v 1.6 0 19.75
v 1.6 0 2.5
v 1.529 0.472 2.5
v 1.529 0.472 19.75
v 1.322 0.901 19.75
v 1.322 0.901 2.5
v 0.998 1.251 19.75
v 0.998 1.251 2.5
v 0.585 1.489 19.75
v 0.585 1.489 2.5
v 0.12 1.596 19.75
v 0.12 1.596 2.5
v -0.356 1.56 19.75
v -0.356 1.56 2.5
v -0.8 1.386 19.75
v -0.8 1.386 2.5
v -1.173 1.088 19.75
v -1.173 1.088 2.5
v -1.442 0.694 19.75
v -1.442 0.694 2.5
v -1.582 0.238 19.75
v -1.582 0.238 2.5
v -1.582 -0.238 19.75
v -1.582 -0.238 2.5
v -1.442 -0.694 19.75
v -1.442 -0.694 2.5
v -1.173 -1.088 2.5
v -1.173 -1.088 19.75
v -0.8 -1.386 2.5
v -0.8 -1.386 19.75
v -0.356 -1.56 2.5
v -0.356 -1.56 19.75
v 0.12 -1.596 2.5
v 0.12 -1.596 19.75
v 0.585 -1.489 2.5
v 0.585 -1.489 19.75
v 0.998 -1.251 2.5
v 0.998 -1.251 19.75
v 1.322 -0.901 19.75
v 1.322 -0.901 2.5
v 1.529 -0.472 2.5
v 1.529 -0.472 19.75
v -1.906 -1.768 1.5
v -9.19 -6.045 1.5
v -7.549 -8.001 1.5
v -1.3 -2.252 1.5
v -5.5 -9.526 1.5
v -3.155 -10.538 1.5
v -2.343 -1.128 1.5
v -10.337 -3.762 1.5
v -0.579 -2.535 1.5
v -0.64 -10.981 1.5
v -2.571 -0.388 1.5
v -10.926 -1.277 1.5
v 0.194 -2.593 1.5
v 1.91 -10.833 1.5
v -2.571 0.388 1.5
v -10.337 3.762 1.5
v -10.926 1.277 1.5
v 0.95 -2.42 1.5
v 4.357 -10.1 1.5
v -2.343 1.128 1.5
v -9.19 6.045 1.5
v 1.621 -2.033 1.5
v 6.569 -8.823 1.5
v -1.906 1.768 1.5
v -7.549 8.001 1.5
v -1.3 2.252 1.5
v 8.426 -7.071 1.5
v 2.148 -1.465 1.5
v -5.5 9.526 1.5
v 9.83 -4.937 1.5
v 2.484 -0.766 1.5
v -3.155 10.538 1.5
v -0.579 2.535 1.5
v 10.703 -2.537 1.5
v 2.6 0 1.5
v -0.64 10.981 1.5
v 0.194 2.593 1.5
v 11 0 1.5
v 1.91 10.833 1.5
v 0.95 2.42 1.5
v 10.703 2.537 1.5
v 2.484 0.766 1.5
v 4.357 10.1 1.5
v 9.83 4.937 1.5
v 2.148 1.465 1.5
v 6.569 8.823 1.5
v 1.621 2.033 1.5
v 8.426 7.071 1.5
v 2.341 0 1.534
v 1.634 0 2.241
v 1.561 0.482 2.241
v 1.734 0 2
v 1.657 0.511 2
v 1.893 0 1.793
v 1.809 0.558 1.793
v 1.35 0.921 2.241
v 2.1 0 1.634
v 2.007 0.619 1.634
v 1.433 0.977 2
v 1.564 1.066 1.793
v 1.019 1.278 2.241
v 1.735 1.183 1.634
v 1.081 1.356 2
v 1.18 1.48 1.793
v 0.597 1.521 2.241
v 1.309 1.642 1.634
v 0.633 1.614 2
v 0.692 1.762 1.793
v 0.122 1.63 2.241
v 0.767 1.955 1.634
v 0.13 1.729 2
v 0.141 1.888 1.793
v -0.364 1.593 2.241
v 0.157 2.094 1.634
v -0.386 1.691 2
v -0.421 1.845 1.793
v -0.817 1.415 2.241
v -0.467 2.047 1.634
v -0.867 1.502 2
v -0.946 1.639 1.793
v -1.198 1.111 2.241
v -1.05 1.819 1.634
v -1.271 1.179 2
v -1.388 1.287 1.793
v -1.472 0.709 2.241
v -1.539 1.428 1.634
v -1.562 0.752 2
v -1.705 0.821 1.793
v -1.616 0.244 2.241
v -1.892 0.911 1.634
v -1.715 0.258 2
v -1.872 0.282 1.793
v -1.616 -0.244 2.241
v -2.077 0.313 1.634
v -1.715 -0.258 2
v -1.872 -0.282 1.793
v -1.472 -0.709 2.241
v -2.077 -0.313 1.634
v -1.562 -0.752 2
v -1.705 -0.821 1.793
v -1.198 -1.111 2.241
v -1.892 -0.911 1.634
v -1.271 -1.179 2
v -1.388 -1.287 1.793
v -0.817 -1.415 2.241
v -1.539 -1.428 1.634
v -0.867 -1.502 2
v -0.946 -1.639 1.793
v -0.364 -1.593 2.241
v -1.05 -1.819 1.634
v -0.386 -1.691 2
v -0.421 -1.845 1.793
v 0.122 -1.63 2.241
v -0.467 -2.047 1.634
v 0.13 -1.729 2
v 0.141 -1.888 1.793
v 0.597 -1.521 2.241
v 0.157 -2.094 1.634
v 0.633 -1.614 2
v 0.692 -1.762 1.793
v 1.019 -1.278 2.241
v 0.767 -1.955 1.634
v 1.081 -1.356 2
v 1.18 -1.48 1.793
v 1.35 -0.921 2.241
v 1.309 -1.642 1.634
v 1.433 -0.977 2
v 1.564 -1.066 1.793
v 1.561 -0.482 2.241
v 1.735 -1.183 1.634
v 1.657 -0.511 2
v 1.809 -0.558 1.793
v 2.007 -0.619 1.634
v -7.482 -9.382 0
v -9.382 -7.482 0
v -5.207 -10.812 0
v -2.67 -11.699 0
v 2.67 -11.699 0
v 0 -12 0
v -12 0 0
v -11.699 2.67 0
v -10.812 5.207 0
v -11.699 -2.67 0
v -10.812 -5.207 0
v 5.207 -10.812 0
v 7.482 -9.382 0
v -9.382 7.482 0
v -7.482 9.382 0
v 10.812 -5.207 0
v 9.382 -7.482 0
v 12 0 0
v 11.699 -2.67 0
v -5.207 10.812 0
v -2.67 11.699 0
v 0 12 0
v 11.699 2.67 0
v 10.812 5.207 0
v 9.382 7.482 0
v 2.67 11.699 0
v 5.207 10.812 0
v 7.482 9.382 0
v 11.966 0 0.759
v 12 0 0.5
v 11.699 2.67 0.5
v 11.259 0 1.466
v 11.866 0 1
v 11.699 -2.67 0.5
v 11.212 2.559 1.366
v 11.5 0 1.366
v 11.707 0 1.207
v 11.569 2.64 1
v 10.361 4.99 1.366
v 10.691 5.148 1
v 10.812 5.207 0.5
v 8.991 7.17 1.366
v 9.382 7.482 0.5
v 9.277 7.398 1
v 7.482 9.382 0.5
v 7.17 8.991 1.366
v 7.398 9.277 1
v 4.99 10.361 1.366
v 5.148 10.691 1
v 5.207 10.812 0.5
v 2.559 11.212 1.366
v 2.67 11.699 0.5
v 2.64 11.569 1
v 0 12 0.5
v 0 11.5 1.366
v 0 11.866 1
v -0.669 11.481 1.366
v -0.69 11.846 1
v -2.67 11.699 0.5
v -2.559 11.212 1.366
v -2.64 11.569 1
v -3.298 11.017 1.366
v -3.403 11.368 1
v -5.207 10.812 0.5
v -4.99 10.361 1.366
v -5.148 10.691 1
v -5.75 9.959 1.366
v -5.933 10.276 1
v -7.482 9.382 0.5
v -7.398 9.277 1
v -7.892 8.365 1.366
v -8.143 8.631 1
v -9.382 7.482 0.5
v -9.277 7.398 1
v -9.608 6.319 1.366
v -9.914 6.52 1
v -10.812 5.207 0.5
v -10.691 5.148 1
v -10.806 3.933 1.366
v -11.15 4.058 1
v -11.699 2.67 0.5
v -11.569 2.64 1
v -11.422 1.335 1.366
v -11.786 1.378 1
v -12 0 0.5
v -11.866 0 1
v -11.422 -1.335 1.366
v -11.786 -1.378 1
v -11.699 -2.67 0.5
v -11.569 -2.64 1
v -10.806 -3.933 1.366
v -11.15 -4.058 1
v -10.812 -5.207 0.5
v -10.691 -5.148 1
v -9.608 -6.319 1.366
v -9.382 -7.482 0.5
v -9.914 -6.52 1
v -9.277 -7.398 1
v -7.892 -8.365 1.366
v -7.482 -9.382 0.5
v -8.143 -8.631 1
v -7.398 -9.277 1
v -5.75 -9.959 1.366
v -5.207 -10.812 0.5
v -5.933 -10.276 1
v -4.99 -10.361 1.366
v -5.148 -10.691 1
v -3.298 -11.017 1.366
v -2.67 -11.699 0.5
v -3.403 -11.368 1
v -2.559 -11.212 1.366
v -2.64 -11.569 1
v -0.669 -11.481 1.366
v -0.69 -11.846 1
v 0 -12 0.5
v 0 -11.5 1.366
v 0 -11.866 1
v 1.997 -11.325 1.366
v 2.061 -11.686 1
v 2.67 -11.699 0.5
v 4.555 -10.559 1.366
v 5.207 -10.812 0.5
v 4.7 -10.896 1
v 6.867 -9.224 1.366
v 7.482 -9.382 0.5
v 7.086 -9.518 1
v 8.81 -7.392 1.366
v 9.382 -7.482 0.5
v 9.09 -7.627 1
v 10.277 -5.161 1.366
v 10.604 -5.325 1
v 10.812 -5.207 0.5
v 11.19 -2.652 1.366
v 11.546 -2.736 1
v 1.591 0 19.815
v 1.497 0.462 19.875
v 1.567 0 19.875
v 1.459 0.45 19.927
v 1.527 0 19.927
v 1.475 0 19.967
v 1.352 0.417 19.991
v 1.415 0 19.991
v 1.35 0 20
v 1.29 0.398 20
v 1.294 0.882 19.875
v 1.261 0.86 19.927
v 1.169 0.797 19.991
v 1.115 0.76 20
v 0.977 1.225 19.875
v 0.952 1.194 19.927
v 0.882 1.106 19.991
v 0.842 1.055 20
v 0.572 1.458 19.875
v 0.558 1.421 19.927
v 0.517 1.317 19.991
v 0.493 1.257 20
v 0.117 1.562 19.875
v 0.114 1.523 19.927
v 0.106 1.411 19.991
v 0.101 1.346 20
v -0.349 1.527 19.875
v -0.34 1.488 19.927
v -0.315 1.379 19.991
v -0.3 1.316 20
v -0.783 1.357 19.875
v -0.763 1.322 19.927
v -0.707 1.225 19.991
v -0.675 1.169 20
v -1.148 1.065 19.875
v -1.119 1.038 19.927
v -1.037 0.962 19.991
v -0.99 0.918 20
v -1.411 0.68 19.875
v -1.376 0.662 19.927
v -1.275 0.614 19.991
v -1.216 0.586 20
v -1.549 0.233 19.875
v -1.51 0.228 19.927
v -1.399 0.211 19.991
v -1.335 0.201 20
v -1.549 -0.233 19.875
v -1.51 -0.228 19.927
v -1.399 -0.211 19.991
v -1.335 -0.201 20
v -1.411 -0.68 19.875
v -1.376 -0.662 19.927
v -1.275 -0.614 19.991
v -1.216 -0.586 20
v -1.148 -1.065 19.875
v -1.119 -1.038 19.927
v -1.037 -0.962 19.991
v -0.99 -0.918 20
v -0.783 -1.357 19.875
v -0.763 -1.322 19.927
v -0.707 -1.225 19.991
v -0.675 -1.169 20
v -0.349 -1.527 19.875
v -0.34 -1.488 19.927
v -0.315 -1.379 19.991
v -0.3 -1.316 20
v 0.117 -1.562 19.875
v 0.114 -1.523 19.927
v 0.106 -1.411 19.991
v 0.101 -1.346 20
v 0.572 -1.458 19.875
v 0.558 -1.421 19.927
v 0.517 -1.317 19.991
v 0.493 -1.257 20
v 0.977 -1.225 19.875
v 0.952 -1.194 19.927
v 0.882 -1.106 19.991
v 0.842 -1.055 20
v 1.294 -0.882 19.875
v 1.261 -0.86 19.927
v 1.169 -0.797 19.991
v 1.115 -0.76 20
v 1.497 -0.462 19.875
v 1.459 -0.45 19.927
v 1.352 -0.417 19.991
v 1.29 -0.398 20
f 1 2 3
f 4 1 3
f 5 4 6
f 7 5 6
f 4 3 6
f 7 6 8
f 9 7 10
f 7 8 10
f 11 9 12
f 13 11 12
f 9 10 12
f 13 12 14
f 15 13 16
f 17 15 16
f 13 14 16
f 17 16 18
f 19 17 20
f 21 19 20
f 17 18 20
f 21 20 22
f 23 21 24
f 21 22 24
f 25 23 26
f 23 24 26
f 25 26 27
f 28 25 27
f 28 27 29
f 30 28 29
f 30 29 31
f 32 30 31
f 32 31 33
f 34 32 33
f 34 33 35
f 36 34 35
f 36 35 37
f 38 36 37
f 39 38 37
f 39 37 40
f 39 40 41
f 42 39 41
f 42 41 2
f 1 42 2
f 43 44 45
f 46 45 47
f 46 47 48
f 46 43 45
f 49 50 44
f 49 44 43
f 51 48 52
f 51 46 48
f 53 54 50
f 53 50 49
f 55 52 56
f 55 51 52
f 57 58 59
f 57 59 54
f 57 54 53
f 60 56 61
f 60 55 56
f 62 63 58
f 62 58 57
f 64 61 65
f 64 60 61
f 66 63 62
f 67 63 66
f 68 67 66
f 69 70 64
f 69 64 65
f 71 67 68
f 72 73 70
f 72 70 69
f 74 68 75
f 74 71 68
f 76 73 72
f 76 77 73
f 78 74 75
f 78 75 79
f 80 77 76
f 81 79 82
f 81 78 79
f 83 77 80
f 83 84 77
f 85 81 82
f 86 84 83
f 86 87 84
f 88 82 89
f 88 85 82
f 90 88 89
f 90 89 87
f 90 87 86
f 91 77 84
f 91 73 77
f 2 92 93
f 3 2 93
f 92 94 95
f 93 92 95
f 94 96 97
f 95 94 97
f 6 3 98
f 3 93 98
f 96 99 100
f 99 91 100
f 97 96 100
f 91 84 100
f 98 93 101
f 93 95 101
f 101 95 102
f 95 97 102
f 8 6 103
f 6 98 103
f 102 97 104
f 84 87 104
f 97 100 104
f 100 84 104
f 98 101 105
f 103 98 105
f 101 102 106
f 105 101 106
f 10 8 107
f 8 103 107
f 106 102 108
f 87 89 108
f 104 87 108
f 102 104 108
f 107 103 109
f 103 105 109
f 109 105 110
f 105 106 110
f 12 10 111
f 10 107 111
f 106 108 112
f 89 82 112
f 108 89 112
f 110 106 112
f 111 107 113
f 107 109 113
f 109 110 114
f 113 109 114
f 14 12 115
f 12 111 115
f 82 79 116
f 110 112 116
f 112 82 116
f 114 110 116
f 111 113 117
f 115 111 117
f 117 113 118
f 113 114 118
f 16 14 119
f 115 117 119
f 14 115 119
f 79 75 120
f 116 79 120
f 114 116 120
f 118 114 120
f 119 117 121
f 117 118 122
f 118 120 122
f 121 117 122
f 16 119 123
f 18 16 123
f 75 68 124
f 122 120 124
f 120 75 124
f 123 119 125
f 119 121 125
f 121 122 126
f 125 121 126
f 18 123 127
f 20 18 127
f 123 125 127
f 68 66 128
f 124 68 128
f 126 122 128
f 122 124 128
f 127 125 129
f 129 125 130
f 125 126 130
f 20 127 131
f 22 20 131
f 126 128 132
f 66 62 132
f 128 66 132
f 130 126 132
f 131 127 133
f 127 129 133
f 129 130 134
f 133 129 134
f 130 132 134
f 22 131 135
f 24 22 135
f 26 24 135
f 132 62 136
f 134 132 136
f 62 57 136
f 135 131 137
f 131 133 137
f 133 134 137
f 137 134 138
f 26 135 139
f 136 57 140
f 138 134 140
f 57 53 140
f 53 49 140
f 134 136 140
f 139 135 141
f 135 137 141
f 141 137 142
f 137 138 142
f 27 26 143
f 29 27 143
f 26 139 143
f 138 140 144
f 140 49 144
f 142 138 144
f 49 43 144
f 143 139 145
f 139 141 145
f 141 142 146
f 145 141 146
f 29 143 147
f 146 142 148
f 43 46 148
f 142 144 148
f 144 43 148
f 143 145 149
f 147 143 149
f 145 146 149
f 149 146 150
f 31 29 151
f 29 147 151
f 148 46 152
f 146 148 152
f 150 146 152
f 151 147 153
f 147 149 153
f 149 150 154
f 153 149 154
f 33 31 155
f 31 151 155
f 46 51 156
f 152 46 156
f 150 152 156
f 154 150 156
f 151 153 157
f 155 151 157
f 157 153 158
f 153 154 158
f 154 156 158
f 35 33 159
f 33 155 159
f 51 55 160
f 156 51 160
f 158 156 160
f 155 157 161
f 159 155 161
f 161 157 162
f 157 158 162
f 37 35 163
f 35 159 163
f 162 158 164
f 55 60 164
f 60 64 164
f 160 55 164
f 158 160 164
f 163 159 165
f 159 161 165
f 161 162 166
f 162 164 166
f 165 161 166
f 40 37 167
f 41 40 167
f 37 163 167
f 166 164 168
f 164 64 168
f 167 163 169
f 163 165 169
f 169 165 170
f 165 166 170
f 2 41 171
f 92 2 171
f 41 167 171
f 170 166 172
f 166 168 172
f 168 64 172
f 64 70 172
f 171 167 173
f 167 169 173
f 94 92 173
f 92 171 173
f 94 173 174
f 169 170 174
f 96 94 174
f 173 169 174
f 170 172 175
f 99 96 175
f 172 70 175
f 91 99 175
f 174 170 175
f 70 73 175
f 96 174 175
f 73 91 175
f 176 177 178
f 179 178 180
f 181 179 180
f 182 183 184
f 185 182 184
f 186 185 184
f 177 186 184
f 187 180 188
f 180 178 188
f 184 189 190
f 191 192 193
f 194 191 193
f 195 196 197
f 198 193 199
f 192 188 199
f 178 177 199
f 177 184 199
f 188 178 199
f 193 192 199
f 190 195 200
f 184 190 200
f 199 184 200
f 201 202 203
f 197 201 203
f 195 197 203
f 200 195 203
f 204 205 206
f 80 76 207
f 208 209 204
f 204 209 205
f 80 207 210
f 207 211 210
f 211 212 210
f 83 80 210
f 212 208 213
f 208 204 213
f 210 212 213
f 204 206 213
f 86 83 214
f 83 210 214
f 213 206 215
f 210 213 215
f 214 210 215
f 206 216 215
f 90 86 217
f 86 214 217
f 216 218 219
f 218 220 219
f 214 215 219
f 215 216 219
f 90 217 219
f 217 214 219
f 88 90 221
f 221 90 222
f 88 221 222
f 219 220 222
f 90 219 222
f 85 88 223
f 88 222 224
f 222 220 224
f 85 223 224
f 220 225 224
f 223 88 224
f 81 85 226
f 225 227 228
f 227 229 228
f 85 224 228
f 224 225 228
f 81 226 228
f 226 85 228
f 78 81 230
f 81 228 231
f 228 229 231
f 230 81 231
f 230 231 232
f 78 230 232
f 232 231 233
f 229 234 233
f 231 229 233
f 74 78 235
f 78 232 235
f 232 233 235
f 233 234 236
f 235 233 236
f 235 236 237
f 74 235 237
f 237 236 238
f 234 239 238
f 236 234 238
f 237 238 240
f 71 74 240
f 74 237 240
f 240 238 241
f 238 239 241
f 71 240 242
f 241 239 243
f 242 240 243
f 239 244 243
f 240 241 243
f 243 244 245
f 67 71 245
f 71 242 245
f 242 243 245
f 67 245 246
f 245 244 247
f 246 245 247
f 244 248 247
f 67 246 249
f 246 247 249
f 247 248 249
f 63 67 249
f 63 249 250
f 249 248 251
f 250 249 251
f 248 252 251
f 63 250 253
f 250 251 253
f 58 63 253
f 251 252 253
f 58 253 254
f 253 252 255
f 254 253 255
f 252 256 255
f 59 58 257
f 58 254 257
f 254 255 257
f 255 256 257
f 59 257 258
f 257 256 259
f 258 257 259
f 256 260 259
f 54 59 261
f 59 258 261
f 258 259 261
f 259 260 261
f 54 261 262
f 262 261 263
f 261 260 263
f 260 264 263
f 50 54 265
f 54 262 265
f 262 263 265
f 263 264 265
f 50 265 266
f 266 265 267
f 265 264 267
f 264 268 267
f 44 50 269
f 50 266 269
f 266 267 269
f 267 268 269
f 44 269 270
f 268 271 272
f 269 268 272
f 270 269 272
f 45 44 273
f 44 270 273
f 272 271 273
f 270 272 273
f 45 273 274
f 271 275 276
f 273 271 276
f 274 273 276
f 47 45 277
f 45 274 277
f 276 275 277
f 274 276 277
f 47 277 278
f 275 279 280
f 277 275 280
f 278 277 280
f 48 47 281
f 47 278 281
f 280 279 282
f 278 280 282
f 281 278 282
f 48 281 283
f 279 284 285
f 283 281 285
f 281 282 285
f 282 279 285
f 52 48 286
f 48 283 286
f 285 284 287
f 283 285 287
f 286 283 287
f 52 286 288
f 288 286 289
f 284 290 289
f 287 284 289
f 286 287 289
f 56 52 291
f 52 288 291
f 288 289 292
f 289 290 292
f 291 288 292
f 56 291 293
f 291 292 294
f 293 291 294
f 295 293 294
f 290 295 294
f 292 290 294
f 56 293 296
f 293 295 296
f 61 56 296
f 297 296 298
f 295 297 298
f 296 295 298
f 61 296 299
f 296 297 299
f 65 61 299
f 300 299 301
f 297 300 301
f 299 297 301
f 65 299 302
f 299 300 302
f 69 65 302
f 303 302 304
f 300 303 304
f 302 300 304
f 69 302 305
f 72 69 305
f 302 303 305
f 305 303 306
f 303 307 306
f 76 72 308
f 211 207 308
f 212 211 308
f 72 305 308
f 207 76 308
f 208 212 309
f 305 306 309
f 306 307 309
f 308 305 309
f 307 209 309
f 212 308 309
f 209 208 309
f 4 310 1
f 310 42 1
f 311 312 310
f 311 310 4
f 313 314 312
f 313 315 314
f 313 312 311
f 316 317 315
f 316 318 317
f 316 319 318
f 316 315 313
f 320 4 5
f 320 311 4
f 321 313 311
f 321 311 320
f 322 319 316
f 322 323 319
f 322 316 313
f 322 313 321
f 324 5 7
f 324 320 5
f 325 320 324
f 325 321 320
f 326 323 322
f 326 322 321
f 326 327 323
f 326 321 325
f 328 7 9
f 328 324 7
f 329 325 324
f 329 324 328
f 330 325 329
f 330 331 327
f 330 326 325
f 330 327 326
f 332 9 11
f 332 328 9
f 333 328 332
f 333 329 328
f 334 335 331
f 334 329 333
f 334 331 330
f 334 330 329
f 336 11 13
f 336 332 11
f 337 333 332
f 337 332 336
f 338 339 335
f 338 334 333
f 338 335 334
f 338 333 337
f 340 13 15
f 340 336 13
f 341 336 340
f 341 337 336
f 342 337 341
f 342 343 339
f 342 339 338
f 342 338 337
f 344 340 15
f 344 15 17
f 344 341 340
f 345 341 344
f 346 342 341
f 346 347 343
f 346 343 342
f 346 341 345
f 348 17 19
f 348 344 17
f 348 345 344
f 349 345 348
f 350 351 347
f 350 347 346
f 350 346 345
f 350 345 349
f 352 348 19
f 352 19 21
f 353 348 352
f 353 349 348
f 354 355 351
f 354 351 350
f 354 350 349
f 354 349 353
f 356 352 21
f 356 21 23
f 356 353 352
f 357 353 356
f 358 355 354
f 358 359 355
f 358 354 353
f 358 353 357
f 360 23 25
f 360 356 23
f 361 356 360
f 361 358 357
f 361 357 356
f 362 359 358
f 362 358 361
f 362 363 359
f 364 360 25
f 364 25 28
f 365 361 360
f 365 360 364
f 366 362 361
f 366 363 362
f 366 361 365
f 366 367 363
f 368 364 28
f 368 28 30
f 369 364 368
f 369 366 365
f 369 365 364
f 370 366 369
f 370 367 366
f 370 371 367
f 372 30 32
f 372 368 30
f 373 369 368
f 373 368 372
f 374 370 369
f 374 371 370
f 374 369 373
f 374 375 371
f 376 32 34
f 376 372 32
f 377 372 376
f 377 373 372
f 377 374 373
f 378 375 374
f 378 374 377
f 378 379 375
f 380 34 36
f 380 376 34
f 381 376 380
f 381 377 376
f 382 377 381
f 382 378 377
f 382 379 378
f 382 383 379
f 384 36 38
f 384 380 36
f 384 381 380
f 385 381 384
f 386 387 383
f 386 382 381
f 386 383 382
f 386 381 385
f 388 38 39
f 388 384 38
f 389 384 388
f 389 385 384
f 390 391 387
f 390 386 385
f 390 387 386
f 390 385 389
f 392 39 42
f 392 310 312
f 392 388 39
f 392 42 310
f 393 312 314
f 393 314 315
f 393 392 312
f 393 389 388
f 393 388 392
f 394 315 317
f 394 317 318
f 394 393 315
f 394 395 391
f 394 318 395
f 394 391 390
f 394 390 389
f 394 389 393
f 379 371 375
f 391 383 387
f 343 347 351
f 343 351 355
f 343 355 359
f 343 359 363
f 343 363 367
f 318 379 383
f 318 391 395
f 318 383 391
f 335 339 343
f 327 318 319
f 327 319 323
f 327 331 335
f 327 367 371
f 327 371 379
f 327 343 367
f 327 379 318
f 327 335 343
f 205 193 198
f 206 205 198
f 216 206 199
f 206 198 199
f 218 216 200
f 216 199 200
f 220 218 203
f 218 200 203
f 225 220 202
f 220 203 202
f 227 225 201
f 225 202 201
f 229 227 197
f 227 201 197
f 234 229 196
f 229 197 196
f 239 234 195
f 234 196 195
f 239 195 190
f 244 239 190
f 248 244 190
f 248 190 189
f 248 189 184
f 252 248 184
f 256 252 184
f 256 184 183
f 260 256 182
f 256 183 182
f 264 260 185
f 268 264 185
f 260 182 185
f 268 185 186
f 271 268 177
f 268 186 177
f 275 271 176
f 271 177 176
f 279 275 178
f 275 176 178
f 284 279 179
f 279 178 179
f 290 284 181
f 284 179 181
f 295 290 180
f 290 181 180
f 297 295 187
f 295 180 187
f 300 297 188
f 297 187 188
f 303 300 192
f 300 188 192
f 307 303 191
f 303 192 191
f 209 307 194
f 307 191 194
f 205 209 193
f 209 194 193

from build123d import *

# Parameters (mm, degrees)
F0_R     = 12
F0_R_2   = 1.6
F1_DEPTH = 1.5
F2_DEPTH = 20
F3_R     = 1
F4_R     = 0.25


with BuildPart() as f1:
    # F0 (on Top) → F1 (new body)
    with BuildSketch(Plane.XY):
        Circle(F0_R)
        Circle(F0_R_2, mode=Mode.SUBTRACT)
    extrude(amount=F1_DEPTH)

    # F0 (on Top) → F2 (join)
    with BuildSketch(Plane.XY):
        Circle(F0_R_2)
    extrude(amount=F2_DEPTH)

    # F3
    f3_edges = [f1.edges().sort_by_distance(p)[0] for p in [
        (-12, 0, 1.5),
        (-1.6, 0, 1.5),
    ]]
    fillet(f3_edges, radius=F3_R)

    # F4
    f4_edges = [f1.edges().sort_by_distance(p)[0] for p in [
        (-1.6, 0, 20),
    ]]
    fillet(f4_edges, radius=F4_R)


solid = f1.part
